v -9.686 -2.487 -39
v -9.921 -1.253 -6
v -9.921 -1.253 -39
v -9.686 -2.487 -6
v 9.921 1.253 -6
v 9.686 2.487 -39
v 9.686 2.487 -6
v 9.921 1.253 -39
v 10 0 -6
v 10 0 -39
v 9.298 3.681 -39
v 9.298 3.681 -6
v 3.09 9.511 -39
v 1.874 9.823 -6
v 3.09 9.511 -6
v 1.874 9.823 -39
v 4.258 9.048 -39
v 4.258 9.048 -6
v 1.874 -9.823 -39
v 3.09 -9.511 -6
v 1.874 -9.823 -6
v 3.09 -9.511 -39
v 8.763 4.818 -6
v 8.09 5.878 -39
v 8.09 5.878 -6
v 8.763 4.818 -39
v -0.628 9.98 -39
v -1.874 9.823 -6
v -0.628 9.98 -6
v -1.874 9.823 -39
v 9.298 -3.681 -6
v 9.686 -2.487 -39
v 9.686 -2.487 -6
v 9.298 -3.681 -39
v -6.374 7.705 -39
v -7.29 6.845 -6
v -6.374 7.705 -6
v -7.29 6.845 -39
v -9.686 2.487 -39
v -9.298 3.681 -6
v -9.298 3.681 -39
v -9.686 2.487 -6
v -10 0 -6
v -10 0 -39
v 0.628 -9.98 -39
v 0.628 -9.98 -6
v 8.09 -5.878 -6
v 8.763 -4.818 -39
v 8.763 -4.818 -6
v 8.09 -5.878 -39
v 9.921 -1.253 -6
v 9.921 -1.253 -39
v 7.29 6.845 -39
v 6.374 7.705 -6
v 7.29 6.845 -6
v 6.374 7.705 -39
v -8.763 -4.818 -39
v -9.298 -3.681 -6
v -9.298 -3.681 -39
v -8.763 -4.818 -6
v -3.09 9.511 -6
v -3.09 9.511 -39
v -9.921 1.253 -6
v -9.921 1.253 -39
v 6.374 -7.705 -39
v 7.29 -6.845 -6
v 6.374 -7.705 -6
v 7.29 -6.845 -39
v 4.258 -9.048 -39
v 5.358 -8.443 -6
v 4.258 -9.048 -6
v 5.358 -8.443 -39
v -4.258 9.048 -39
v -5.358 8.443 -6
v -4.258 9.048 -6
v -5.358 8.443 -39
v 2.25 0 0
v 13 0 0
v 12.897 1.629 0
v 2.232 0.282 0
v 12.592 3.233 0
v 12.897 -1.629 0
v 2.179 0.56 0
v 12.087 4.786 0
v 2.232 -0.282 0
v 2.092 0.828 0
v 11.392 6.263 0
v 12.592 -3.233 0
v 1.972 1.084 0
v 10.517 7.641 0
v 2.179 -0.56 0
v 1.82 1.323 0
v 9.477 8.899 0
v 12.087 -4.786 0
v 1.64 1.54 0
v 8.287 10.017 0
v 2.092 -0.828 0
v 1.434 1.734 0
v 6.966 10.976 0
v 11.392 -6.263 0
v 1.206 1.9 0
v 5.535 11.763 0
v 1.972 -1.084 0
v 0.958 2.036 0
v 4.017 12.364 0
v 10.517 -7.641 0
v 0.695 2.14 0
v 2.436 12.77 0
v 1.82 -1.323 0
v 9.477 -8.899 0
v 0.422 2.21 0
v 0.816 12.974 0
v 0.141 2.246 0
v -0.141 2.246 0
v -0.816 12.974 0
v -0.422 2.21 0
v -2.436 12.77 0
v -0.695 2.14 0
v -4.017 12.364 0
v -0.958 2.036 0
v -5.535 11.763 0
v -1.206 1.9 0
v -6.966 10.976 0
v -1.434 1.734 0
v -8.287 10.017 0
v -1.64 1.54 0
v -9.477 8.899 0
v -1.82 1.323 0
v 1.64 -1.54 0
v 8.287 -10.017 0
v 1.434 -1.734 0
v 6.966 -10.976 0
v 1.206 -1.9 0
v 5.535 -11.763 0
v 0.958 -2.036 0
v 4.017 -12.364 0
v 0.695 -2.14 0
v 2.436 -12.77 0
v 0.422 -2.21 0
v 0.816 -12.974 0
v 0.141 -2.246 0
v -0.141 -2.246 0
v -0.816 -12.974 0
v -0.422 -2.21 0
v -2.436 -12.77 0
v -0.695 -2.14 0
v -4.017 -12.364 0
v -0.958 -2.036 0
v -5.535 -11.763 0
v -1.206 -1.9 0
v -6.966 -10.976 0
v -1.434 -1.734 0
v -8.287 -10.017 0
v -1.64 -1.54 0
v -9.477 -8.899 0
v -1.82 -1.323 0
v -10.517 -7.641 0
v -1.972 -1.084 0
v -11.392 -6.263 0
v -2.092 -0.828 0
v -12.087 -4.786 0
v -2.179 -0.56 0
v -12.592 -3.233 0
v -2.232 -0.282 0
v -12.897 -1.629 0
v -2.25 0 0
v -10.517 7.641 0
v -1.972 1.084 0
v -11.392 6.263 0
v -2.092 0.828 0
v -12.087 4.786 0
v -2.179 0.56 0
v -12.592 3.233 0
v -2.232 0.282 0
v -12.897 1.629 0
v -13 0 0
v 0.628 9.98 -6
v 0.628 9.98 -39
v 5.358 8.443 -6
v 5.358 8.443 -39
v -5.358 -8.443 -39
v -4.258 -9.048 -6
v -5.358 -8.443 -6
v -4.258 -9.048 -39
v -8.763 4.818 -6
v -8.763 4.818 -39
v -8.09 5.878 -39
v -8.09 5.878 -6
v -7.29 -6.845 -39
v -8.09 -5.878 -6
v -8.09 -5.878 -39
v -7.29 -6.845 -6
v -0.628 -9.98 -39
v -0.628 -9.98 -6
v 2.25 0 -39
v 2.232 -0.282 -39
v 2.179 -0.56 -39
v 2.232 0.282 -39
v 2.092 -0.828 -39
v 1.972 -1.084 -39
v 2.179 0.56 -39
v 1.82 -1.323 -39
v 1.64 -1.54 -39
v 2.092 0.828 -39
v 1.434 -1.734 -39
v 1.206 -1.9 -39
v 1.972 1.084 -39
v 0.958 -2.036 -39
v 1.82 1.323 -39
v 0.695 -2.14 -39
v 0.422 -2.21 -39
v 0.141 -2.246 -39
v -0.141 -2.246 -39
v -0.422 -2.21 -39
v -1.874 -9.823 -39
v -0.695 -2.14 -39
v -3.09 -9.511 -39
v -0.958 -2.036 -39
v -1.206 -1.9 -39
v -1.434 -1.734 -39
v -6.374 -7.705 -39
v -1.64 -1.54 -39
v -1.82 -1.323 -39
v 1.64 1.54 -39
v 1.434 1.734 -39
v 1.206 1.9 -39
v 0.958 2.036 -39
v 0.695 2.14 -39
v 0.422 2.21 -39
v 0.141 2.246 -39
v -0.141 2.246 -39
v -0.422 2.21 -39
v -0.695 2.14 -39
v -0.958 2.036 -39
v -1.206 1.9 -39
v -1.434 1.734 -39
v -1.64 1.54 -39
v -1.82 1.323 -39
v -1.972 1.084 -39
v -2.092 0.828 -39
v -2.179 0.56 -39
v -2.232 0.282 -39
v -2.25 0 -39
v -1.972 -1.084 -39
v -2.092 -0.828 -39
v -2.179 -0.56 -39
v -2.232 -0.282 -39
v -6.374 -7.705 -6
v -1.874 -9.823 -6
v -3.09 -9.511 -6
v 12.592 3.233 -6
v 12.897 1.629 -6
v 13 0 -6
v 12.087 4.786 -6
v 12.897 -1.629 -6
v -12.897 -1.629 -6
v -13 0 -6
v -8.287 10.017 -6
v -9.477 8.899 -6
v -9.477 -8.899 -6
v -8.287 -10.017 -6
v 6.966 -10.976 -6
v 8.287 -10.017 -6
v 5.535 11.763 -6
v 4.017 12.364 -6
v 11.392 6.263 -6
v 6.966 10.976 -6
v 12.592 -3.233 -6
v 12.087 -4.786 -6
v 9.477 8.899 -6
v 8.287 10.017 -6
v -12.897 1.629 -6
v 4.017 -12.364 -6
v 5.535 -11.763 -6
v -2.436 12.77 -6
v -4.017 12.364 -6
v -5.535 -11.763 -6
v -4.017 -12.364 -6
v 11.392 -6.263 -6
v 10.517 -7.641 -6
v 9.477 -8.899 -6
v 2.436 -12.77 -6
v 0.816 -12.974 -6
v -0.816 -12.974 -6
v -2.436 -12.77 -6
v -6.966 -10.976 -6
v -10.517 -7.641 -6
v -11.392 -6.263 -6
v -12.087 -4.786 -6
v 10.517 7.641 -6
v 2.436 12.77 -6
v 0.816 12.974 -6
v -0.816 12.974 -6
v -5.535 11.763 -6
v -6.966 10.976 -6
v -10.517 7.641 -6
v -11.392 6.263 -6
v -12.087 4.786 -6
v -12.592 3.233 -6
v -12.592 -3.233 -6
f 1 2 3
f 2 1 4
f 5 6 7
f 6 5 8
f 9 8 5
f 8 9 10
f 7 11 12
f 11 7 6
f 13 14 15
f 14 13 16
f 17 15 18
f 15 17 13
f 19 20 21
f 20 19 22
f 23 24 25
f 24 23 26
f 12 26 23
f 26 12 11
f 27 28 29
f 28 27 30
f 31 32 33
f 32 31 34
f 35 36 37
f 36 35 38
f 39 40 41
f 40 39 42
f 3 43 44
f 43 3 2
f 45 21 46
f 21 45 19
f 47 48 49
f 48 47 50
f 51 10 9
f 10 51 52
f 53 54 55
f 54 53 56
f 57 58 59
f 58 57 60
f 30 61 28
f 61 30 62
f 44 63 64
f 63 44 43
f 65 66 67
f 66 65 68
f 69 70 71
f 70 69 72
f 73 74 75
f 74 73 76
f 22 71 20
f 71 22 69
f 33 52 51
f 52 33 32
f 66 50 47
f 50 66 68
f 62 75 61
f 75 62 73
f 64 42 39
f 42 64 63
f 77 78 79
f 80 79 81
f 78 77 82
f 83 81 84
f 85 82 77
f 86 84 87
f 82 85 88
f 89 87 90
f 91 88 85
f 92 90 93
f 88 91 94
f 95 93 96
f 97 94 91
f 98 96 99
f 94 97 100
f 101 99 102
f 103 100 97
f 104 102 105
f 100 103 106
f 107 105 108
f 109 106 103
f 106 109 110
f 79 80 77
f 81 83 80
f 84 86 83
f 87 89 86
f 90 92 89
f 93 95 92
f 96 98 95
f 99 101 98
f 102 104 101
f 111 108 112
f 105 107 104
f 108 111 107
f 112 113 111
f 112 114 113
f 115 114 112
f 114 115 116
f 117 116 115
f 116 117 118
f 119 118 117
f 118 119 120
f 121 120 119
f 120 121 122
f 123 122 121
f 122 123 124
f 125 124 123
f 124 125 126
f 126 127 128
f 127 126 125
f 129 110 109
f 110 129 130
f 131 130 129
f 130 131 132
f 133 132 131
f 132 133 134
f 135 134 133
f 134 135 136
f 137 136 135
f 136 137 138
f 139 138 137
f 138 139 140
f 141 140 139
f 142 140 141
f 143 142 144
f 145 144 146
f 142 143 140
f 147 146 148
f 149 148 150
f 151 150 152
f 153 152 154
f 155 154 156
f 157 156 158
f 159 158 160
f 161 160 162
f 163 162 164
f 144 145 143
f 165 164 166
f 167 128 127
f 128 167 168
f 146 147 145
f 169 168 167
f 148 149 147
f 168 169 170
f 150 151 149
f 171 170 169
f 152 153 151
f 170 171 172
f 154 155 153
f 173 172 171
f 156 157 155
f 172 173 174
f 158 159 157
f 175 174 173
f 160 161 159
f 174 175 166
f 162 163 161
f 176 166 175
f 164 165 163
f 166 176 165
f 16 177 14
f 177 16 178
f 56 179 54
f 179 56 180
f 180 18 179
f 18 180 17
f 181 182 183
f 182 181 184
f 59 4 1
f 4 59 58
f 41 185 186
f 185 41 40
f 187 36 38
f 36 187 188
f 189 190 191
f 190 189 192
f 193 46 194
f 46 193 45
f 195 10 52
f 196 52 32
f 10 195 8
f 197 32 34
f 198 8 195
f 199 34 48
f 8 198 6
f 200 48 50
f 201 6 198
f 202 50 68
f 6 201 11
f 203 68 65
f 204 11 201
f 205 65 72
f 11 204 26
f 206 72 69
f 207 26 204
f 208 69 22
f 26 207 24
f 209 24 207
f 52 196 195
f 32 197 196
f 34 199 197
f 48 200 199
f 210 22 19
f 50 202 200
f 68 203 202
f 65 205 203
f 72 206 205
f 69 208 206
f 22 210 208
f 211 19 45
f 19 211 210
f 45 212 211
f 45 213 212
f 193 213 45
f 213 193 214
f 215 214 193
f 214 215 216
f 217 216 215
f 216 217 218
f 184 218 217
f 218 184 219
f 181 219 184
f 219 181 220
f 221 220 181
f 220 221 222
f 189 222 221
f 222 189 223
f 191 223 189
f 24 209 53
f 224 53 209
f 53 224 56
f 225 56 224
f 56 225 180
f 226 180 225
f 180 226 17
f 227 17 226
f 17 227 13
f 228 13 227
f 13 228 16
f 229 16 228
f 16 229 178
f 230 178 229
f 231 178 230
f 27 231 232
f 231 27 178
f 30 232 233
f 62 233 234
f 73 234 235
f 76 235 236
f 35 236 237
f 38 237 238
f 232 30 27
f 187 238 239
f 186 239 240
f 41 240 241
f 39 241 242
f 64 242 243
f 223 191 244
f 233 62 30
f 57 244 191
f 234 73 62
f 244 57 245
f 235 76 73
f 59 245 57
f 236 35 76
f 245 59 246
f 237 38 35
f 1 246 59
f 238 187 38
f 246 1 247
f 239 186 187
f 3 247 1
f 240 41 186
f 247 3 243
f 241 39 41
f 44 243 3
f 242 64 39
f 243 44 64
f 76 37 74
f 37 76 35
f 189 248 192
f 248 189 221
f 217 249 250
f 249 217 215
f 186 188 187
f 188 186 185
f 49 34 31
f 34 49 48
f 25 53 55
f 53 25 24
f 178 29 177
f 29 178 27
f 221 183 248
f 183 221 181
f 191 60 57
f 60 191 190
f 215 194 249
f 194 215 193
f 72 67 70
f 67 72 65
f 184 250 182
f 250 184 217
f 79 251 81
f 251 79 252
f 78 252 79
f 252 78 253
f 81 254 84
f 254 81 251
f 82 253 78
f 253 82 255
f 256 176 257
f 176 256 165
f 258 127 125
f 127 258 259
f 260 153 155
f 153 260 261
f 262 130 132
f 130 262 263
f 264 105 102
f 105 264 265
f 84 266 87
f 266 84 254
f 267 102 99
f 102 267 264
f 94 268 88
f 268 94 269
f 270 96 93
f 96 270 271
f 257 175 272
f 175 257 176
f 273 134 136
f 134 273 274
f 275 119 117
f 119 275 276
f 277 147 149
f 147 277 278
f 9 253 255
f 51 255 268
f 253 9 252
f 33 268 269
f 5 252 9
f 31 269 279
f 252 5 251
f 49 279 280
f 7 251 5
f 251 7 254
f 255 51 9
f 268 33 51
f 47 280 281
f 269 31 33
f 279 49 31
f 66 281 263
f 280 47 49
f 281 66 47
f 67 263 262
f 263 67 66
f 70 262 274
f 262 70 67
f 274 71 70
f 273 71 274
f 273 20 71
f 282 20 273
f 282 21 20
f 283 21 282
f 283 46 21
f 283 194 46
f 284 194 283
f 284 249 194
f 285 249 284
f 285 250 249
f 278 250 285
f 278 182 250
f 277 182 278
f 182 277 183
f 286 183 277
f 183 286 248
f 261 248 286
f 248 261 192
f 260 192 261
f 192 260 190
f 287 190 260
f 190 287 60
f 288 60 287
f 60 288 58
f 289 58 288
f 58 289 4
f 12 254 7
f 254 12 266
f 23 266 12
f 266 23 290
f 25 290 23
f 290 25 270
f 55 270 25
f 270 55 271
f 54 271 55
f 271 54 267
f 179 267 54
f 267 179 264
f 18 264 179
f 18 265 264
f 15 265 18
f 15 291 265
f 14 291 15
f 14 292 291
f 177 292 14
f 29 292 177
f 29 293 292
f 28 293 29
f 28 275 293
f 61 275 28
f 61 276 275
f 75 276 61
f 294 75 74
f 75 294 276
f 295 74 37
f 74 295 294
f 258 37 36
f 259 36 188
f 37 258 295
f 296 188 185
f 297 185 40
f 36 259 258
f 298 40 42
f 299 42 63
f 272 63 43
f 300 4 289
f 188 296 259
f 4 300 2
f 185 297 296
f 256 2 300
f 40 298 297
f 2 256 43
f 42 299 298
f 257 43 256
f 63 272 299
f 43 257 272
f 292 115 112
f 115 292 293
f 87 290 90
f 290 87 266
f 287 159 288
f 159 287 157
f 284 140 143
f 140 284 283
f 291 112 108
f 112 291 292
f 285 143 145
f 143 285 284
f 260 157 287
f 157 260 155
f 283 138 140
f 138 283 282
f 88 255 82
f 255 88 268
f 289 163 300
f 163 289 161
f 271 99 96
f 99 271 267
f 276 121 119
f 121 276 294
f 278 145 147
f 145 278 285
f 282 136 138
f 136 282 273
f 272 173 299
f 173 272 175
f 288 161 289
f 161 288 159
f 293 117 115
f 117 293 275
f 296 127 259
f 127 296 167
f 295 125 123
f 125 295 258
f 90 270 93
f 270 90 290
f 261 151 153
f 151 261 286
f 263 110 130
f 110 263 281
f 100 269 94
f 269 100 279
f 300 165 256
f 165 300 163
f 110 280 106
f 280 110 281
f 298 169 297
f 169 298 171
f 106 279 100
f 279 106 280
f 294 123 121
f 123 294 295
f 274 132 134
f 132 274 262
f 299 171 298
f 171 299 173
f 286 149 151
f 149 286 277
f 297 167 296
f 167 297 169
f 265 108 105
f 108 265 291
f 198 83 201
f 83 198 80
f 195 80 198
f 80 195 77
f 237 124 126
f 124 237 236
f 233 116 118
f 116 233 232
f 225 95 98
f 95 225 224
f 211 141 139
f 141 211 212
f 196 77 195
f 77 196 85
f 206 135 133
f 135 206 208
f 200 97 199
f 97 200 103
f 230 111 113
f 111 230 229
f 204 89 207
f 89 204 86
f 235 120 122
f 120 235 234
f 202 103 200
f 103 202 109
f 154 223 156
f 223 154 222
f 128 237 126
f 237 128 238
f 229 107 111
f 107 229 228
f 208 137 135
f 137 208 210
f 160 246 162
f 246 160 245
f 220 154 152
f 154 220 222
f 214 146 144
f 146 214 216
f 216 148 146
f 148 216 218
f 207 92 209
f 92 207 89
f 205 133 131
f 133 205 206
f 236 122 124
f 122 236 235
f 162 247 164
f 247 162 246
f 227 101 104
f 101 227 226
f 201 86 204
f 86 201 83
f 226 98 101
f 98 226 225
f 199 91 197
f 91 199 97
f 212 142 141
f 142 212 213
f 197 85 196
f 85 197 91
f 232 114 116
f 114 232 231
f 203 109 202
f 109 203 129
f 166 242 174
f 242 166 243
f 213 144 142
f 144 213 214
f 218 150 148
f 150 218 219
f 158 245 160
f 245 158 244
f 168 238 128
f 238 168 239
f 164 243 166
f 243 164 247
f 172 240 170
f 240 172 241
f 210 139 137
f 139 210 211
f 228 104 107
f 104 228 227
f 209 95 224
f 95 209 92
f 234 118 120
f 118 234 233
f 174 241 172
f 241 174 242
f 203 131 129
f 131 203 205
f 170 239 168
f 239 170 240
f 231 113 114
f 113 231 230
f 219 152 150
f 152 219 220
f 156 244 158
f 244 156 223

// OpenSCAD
$fn = 50;


difference() {
	union() {
		translate(v = [0, 0, -39.0000000000]) {
			cylinder(h = 39, r = 10.0000000000);
		}
		translate(v = [0, 0, -6.0000000000]) {
			cylinder(h = 6, r = 13.0000000000);
		}
	}
	union() {
		#translate(v = [0, 0, -39]) {
			cylinder(h = 39, r = 2.2500000000);
		}
	}
}
